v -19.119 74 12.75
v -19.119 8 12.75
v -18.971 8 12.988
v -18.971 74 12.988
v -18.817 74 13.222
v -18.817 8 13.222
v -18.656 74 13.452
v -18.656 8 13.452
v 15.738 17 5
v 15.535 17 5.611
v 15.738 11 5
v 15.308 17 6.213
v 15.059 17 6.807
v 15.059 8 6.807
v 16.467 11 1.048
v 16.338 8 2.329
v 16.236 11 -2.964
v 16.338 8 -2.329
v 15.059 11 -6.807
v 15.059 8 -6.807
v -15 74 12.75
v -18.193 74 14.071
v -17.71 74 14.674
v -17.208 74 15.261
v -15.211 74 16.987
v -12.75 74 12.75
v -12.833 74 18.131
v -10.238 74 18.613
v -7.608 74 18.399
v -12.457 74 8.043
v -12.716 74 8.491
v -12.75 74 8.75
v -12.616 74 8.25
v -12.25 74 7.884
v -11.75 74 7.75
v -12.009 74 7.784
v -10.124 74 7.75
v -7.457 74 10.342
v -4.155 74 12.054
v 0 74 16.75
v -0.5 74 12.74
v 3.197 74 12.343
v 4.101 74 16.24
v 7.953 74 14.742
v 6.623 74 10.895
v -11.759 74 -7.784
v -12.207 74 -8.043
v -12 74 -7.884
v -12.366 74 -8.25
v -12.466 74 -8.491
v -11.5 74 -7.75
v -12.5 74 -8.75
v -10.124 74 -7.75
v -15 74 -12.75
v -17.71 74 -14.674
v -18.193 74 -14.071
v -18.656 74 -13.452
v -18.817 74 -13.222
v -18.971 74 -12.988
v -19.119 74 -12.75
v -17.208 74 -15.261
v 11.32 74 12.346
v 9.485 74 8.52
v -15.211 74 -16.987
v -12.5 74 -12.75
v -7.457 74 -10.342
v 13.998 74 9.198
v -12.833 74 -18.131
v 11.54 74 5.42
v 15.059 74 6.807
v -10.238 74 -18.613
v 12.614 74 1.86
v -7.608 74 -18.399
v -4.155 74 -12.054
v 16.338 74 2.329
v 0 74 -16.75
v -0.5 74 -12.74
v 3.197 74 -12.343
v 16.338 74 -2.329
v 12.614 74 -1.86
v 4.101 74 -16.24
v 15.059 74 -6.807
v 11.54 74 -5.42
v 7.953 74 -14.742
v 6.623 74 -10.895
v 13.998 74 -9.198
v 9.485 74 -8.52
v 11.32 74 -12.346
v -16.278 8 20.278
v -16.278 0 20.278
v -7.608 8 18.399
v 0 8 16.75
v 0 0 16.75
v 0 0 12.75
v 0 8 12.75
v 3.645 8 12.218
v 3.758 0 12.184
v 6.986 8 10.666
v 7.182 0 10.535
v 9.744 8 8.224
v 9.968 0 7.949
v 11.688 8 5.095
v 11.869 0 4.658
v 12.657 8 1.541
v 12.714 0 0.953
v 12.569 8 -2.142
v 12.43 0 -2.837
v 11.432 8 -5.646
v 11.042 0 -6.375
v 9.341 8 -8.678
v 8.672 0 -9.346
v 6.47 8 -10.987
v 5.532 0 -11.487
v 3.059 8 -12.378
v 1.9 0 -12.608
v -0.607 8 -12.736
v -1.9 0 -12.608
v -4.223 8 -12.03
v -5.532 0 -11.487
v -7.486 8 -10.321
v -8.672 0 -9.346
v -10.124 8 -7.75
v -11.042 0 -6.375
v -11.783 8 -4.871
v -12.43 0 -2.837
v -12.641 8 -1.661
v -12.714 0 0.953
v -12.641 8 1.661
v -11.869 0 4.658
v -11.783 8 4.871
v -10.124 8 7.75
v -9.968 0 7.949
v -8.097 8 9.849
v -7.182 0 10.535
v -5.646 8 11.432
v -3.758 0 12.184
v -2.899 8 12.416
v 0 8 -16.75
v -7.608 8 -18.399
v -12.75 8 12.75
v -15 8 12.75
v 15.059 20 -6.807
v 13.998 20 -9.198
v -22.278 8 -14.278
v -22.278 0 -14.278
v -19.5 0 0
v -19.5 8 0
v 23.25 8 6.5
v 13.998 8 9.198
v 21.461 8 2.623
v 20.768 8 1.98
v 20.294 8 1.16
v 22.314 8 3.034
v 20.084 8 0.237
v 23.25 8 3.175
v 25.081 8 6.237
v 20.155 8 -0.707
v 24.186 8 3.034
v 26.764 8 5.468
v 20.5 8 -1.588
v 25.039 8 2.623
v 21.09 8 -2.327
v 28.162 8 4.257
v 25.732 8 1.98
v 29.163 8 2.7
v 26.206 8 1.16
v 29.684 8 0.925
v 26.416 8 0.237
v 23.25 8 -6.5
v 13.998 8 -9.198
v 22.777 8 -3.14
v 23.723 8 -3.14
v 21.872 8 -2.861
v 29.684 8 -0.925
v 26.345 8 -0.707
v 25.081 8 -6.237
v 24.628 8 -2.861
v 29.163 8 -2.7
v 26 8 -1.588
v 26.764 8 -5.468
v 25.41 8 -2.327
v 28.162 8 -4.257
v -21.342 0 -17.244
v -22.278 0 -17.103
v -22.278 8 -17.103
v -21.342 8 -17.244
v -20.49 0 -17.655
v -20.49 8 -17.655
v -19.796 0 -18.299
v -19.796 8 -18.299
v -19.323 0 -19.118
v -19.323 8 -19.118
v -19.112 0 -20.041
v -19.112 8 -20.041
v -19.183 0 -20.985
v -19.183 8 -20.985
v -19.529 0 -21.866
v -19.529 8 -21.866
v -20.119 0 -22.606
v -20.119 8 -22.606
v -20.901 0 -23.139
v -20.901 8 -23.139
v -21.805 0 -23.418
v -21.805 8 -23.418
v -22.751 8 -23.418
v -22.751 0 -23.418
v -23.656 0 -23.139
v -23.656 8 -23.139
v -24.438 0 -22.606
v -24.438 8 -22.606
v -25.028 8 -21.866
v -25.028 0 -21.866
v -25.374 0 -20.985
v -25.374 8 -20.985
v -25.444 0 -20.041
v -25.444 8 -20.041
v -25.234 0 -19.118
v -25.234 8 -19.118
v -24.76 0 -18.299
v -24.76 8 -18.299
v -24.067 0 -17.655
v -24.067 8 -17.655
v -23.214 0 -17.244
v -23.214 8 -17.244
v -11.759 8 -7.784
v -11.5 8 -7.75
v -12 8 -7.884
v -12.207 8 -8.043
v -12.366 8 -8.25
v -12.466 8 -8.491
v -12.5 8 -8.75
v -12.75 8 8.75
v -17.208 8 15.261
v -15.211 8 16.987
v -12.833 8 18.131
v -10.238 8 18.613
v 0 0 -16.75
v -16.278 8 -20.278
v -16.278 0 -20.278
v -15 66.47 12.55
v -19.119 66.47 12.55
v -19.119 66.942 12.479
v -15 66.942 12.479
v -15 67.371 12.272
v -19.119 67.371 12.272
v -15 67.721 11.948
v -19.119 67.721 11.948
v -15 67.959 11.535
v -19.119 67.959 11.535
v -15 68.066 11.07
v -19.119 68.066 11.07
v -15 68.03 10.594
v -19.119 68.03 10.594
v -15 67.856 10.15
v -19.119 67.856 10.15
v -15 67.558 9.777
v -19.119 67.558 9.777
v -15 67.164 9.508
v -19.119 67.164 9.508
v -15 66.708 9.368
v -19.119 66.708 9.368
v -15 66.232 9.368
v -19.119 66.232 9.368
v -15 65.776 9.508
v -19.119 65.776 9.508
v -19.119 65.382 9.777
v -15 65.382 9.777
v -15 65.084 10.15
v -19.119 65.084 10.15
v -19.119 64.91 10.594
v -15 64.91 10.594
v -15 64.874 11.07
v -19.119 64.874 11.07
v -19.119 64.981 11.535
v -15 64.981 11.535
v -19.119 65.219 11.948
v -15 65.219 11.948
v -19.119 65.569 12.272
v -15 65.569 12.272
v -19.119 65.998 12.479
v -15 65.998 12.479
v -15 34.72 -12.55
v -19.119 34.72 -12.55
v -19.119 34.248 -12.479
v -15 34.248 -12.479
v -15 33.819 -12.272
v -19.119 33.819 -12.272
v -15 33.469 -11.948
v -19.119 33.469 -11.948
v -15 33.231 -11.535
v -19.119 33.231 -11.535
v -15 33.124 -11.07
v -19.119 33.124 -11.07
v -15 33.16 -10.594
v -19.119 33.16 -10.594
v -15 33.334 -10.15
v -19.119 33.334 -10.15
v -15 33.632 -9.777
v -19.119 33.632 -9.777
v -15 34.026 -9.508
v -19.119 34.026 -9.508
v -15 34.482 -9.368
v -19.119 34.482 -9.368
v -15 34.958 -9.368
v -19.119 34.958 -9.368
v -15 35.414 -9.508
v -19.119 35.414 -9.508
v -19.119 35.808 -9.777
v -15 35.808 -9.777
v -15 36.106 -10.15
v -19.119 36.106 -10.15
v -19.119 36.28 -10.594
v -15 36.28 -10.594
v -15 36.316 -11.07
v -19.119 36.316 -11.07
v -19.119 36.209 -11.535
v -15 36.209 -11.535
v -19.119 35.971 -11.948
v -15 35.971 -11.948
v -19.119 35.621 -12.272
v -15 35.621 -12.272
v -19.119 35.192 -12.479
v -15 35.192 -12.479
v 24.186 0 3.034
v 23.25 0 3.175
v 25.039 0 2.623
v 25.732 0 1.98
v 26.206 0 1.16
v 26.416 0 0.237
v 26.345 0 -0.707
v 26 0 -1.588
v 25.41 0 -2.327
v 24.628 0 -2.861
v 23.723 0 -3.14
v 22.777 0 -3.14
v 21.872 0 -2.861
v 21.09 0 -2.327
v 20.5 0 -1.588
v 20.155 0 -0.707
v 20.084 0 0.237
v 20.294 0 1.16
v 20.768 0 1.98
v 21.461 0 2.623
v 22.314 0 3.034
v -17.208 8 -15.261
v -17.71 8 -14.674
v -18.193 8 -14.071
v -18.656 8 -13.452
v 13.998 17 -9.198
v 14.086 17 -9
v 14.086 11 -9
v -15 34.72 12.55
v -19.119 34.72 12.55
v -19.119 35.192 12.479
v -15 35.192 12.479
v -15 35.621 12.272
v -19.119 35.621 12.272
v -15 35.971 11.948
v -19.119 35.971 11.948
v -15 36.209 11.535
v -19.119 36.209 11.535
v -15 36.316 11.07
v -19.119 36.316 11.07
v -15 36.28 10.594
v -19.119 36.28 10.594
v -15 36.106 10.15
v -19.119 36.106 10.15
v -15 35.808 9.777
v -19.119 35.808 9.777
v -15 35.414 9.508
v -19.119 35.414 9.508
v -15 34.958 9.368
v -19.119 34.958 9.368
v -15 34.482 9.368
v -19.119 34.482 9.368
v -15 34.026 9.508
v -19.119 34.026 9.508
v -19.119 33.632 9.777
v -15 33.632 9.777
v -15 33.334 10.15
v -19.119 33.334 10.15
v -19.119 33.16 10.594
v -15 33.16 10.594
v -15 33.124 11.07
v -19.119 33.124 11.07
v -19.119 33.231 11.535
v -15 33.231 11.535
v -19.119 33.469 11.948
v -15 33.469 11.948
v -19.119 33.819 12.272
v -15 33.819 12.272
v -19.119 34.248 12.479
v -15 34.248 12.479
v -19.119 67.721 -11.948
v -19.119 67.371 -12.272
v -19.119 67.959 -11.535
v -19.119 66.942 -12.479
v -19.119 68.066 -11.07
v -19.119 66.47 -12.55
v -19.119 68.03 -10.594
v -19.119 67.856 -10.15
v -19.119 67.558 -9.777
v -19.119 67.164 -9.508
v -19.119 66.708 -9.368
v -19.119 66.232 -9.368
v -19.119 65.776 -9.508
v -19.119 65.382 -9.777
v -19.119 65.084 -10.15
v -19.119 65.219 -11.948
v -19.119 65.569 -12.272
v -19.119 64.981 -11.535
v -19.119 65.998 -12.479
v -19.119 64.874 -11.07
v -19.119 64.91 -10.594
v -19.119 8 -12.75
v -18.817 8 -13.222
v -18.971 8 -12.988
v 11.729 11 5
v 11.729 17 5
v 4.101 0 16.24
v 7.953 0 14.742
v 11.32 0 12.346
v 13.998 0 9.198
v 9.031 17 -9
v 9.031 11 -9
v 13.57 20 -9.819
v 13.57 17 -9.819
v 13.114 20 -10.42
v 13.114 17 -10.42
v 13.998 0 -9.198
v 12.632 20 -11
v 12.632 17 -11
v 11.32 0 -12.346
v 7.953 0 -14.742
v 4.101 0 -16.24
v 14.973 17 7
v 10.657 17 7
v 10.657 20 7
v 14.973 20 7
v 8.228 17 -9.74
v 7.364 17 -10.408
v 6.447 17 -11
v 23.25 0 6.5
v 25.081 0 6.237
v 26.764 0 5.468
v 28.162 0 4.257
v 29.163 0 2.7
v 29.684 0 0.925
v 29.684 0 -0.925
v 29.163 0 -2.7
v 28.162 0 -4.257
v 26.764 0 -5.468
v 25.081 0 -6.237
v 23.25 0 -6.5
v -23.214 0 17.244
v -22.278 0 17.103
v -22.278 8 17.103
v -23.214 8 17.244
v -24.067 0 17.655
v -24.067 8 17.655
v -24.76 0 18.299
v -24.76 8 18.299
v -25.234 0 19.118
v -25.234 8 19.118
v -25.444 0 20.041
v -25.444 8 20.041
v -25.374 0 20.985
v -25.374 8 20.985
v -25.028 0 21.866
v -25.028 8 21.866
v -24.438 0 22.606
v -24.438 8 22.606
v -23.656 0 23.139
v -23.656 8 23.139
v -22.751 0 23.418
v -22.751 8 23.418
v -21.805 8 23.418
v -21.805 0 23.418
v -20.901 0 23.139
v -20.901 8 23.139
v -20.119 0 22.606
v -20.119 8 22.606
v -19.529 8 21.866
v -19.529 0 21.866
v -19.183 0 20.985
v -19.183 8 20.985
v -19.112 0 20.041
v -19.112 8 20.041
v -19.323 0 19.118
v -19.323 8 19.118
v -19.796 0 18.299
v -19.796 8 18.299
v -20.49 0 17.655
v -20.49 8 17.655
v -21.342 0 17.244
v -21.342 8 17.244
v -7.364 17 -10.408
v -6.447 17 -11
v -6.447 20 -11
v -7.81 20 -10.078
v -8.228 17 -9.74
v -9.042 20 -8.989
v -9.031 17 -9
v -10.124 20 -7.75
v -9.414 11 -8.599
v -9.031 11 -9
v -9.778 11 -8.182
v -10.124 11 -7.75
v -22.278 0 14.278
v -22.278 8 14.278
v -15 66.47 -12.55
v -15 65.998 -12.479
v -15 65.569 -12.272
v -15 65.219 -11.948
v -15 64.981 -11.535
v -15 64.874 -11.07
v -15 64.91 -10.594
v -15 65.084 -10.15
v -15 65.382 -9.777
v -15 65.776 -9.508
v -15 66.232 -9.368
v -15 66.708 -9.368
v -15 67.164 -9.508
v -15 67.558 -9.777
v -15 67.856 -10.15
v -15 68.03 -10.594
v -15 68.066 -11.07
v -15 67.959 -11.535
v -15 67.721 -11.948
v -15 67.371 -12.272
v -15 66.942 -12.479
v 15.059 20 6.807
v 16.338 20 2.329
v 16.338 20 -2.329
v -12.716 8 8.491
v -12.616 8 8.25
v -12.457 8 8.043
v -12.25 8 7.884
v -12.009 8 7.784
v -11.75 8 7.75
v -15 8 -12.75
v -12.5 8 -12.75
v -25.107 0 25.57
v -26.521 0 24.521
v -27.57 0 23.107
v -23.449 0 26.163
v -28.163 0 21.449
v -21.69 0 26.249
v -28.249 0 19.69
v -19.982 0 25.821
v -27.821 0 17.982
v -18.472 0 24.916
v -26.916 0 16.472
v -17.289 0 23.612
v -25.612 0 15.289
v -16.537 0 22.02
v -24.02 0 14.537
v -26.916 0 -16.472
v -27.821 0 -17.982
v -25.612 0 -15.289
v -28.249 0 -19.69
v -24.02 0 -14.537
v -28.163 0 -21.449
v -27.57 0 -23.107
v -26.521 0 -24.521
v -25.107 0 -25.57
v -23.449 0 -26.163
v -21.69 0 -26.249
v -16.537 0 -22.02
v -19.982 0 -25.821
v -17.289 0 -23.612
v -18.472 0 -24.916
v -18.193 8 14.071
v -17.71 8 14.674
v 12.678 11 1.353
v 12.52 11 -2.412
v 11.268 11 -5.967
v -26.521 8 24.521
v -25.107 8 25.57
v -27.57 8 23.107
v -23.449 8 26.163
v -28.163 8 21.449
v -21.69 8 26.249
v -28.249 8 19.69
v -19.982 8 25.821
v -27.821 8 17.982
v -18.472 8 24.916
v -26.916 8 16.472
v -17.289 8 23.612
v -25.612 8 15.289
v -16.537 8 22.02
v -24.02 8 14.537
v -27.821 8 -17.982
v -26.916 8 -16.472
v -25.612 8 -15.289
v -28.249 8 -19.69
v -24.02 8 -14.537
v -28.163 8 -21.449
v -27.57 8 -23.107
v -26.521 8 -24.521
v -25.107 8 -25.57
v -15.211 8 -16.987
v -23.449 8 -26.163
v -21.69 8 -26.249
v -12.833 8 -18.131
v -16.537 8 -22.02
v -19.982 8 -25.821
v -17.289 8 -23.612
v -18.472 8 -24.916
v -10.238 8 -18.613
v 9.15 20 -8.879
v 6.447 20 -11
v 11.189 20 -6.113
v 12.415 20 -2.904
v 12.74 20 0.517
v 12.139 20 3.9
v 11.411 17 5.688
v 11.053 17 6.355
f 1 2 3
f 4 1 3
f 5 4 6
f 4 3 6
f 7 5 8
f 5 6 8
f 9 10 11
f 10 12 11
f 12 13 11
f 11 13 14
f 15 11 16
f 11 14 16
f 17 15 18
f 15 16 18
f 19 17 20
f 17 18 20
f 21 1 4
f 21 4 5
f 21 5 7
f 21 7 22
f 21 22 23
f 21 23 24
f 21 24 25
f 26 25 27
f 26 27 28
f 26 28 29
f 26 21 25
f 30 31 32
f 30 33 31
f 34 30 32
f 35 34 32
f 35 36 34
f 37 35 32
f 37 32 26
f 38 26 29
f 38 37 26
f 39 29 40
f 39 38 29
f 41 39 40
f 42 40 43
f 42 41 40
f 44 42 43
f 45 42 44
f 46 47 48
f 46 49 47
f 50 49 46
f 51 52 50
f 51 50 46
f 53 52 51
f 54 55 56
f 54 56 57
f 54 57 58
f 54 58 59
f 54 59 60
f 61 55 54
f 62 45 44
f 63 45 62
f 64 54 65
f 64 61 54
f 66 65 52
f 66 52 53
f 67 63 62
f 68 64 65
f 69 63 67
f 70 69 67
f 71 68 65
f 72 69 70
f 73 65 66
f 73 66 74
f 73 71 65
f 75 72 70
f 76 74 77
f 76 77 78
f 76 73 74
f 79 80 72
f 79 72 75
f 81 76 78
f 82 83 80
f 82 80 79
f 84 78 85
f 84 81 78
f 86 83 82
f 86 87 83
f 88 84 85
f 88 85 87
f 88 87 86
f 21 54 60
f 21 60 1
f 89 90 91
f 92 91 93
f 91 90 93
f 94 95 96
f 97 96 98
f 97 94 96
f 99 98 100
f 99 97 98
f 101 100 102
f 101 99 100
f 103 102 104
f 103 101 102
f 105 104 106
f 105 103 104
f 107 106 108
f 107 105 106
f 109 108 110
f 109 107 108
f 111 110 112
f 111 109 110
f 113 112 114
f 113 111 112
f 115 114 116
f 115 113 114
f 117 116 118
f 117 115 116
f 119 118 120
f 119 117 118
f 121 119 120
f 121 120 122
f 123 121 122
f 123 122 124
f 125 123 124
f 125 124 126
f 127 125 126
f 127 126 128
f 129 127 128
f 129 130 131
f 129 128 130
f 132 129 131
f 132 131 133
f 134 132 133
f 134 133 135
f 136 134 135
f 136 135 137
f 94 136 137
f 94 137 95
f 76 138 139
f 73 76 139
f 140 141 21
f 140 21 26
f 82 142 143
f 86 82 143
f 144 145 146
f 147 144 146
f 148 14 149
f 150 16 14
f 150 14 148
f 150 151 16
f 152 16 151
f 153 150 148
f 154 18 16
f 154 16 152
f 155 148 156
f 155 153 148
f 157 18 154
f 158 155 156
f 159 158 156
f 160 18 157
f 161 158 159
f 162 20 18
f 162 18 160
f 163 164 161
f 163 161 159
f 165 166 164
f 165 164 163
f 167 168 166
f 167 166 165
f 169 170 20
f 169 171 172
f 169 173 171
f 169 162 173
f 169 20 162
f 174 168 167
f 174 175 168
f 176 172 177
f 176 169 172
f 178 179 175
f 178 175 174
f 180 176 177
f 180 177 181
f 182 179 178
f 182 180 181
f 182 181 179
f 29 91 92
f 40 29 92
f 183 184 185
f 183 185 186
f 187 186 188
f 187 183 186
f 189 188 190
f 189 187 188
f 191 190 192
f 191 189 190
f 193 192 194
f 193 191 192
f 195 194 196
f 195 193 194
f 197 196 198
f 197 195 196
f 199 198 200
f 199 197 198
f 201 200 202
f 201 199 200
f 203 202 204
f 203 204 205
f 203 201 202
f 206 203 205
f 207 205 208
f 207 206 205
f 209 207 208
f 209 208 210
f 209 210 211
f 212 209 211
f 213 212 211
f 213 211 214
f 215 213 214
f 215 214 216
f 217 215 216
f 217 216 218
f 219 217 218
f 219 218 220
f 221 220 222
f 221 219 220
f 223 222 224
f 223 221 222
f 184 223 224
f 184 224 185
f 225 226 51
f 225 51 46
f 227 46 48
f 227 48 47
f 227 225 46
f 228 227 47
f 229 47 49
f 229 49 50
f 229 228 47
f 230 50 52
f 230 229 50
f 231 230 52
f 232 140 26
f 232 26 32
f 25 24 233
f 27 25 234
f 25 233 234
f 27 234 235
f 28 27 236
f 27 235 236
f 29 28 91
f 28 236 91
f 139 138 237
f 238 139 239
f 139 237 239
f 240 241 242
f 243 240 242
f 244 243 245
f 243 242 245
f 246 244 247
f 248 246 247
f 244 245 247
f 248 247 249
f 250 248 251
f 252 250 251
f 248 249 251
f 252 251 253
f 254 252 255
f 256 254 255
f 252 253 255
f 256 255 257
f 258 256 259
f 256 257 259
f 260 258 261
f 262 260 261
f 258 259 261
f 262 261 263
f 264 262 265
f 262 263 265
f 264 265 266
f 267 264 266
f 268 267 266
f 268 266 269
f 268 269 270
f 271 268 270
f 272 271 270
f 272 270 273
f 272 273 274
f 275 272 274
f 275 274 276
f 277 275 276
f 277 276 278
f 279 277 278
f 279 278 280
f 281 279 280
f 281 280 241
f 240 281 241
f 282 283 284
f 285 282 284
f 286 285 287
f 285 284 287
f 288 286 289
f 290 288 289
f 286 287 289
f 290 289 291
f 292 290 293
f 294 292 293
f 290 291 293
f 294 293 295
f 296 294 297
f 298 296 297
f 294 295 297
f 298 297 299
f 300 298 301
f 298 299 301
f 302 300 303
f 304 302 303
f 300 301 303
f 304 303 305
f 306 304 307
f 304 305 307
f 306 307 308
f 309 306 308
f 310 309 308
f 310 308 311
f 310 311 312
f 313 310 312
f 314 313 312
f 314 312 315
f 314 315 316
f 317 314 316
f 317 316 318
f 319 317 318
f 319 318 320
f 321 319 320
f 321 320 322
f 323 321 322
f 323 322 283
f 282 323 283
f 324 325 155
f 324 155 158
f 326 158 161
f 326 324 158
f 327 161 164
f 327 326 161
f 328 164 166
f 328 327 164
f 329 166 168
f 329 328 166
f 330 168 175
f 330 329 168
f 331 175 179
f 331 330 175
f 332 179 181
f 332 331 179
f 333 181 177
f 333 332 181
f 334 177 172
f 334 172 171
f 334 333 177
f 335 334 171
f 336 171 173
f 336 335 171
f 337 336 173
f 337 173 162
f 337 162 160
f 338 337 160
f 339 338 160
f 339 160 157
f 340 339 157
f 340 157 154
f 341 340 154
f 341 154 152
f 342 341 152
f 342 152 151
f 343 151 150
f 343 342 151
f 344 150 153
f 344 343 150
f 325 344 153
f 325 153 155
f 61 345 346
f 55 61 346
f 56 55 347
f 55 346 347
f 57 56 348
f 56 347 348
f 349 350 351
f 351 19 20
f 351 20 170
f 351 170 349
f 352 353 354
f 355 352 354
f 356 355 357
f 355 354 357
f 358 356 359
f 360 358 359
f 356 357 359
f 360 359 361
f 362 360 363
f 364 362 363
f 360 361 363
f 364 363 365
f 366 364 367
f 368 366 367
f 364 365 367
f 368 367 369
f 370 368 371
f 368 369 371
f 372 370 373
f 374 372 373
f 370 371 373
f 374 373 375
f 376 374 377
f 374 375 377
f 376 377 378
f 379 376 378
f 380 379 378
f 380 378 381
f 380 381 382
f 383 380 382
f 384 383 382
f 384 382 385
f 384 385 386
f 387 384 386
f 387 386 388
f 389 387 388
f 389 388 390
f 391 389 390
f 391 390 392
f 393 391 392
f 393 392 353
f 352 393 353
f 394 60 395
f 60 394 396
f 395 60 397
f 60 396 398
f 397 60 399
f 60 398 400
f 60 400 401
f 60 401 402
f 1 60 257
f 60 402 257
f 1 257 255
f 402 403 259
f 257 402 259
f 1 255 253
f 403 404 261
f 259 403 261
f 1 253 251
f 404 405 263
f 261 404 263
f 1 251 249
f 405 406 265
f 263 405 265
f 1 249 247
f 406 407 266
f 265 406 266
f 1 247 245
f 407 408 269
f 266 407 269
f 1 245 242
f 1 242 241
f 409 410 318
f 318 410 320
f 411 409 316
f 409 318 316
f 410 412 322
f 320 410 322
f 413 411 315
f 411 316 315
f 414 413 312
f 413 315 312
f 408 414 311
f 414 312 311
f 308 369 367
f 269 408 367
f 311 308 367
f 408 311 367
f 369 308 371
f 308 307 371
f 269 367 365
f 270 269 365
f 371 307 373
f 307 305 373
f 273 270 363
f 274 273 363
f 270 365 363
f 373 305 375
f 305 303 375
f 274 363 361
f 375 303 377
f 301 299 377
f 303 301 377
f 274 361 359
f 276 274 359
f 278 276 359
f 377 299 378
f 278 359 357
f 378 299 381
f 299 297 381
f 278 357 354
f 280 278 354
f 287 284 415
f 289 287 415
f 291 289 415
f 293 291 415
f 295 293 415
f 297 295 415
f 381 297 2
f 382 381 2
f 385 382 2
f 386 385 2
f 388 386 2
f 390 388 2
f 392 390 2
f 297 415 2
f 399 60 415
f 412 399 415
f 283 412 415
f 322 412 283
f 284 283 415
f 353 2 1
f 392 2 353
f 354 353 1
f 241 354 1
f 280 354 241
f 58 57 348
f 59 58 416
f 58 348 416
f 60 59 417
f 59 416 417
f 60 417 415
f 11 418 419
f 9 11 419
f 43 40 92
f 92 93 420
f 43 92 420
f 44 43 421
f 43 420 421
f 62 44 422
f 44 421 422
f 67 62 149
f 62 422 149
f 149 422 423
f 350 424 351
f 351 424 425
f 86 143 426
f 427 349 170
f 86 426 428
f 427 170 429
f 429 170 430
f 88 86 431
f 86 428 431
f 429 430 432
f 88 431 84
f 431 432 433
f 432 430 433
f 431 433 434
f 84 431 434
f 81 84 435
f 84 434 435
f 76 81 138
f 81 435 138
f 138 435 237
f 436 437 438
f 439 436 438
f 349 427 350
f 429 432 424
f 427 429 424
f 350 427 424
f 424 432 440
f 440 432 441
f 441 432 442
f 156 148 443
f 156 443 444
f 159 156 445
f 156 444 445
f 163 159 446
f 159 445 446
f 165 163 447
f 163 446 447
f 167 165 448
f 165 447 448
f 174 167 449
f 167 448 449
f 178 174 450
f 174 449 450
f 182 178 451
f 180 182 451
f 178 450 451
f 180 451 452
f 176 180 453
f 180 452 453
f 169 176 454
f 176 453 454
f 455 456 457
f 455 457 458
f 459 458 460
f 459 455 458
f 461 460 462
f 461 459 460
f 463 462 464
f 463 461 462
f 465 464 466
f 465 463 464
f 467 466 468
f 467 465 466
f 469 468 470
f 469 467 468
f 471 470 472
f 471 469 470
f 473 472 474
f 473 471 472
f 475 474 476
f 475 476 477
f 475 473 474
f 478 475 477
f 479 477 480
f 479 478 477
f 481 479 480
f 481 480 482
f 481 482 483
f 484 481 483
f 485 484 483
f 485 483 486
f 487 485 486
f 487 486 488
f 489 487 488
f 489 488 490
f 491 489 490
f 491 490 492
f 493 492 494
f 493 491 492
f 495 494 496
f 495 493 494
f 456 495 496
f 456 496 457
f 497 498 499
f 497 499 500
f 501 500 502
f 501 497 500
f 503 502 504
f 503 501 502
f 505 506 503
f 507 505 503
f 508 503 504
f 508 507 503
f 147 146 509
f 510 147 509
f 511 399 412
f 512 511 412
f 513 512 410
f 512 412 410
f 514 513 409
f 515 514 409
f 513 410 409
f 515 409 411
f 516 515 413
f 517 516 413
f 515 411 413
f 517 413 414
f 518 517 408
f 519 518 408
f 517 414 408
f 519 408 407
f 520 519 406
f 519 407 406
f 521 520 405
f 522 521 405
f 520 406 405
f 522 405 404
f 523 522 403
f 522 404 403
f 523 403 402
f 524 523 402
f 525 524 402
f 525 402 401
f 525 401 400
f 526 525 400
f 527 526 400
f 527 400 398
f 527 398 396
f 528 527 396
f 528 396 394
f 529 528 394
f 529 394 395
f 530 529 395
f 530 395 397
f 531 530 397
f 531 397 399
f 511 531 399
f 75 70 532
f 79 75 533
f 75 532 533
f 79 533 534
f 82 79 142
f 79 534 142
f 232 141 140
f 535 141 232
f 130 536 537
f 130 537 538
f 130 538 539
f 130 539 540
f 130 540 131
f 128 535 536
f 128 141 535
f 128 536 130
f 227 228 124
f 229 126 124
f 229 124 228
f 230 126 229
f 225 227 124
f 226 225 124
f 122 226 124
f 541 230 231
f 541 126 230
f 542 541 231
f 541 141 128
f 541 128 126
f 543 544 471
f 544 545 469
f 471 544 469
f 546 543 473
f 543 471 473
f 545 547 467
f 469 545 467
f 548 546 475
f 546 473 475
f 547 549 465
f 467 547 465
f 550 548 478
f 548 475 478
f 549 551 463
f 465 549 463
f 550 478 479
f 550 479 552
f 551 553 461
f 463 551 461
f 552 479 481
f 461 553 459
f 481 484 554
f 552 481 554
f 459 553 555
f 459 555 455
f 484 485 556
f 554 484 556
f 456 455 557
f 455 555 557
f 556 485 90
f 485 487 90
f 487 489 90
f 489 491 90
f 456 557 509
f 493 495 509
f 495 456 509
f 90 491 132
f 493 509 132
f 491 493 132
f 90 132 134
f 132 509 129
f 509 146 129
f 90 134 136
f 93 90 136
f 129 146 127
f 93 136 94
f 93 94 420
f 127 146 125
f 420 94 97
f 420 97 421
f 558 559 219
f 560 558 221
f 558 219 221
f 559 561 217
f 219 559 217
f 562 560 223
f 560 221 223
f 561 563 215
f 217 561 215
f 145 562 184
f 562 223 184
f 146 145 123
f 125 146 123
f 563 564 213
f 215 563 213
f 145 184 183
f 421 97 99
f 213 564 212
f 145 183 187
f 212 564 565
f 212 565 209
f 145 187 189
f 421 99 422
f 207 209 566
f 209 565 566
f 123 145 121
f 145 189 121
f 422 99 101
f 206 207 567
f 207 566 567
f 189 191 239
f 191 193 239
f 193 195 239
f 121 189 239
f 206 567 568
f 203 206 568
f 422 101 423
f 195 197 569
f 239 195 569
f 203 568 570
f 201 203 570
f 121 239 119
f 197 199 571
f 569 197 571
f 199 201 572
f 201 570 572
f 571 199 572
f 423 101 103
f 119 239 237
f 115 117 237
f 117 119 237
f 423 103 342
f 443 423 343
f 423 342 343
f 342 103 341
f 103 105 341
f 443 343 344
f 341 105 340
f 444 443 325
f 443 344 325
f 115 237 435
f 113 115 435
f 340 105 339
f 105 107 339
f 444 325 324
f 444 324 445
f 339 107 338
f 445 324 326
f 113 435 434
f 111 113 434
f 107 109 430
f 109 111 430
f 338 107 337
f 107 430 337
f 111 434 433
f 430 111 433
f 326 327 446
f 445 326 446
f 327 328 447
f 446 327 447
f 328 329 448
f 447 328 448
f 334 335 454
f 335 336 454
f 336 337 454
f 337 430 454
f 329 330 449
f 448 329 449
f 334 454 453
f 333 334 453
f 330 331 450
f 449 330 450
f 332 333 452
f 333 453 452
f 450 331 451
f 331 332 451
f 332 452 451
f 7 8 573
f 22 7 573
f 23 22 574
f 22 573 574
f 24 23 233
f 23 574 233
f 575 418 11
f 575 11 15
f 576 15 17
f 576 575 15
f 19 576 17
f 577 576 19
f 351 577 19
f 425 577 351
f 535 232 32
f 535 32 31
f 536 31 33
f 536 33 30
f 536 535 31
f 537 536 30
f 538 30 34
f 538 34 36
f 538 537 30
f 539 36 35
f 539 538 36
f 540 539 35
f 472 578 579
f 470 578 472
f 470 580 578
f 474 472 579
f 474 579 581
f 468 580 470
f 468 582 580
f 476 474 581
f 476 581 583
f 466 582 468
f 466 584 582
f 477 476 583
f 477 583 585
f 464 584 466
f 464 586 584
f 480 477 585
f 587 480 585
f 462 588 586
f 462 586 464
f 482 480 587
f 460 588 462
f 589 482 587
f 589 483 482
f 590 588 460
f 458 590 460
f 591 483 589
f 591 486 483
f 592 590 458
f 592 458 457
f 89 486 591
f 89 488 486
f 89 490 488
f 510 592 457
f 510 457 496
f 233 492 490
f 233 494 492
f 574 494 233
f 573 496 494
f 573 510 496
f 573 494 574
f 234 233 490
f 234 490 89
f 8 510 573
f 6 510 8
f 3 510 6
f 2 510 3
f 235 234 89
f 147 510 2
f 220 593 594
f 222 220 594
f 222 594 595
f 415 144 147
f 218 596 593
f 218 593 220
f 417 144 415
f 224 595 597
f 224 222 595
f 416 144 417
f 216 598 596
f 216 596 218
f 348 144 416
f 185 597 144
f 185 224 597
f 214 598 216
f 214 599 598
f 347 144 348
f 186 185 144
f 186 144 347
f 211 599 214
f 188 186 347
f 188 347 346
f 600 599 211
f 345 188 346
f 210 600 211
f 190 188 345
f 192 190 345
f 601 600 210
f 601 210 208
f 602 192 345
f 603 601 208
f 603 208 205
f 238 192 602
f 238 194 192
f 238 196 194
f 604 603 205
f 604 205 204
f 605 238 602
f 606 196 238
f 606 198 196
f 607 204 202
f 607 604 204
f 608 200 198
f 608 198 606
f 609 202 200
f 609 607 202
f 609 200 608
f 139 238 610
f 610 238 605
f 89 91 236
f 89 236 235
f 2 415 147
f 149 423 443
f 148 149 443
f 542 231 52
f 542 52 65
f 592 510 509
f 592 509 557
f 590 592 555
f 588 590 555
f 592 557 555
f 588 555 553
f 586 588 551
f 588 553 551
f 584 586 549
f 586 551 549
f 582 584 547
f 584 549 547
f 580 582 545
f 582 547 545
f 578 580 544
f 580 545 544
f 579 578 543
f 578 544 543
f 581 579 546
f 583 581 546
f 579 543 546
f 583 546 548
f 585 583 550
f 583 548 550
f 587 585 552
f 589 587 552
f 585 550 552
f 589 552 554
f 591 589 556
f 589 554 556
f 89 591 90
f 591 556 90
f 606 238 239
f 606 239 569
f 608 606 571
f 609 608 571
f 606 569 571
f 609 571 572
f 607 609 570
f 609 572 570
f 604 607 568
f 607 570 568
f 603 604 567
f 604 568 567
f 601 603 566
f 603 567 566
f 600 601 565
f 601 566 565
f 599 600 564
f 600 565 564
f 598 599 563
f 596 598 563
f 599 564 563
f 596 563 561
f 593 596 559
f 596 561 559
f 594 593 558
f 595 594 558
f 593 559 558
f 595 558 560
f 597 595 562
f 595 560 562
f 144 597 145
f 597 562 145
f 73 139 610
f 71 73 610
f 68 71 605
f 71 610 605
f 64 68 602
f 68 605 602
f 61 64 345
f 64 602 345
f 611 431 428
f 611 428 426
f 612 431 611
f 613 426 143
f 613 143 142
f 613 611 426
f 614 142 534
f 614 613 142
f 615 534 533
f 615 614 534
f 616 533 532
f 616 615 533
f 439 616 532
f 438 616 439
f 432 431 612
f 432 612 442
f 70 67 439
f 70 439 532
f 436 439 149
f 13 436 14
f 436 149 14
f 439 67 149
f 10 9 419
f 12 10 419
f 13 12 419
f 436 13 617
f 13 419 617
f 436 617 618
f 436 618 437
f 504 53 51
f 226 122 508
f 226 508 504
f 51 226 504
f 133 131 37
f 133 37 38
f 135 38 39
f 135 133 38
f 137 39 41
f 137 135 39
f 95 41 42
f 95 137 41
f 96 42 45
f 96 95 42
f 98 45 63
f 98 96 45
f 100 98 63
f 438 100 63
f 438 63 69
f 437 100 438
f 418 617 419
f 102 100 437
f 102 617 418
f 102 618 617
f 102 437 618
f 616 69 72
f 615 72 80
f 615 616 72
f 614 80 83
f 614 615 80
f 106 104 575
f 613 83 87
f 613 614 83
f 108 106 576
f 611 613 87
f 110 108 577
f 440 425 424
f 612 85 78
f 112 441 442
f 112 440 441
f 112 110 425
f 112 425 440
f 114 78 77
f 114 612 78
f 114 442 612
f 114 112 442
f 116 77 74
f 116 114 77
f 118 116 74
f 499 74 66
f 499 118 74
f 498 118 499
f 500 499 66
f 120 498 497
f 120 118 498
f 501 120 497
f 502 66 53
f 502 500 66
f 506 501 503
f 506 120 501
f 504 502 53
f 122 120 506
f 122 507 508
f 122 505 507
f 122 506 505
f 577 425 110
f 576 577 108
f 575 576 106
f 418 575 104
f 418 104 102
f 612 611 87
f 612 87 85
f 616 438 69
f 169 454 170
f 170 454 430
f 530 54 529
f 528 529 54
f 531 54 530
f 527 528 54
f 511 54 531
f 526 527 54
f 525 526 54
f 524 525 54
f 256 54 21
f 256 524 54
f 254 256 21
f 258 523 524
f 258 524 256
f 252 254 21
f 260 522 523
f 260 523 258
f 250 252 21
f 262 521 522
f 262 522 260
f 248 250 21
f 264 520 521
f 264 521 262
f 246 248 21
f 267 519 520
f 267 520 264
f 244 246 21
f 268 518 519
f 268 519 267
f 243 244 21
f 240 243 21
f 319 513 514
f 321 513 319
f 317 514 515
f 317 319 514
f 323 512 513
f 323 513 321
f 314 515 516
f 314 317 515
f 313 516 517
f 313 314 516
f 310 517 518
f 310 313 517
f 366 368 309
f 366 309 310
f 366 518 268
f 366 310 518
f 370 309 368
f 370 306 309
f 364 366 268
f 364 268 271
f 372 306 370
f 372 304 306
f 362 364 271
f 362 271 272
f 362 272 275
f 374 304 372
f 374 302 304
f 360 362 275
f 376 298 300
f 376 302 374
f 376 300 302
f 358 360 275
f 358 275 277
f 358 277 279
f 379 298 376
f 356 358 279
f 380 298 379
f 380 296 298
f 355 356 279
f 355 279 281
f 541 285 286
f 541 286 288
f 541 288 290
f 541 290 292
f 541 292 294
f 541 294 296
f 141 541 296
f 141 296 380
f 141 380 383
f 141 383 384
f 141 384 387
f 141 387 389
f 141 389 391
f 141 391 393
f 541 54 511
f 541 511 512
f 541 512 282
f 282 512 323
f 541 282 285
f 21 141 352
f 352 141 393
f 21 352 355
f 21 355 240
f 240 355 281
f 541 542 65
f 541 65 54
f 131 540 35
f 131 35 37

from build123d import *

# Parameters (mm, degrees)
SKETCH1_R           = 12.75
SKETCH1_R_2         = 3.175
BOSS_EXTRUDE2_DEPTH = 8
BOSS_EXTRUDE3_DEPTH = 66
SKETCH4_R           = 1.6
CUT_EXTRUDE1_DEPTH  = 6
CUT_EXTRUDE2_DEPTH  = 62
BOSS_EXTRUDE4_DEPTH = 10
CUT_EXTRUDE3_START  = -66
CUT_EXTRUDE3_DEPTH  = 66


with BuildPart() as part:
    # Sketch1 → Boss-Extrude2 (new body)
    with BuildSketch(Plane(origin=(0, 0, 0), x_dir=(1, 0, 0), z_dir=(0, 1, 0))):
        with BuildLine():
            Line((0, 16.75), (-16.278174593, 20.278174593))
            ThreePointArc((-16.278174593, 20.278174593), (-26.52081528, 24.52081528), (-22.278174593, 14.278174593))
            Line((-22.278174593, 14.278174593), (-19.5, 0))
            Line((-19.5, 0), (-22.278174593, -14.278174593))
            ThreePointArc((-22.278174593, -14.278174593), (-26.52081528, -24.52081528), (-16.278174593, -20.278174593))
            Line((-16.278174593, -20.278174593), (0, -16.75))
            ThreePointArc((0, -16.75), (7.9526392, -14.741710543), (13.998269272, -9.198421462))
            Line((13.998269272, -9.198421462), (23.25, -6.5))
            ThreePointArc((23.25, -6.5), (29.75, 0), (23.25, 6.5))
            Line((23.25, 6.5), (13.998269272, 9.198421462))
            ThreePointArc((13.998269272, 9.198421462), (7.9526392, 14.741710543), (0, 16.75))
        make_face()
        with Locations(Location((0, 0, 0), (0, 0, 270))):
            Circle(SKETCH1_R, mode=Mode.SUBTRACT)
        with Locations(Location((23.25, 0, 0), (0, 0, 270))):
            Circle(SKETCH1_R_2, mode=Mode.SUBTRACT)
        with Locations(Location((-22.278174593, 20.278174593, 0), (0, 0, 270))):
            Circle(SKETCH1_R_2, mode=Mode.SUBTRACT)
        with Locations(Location((-22.278174593, -20.278174593, 0), (0, 0, 90))):
            Circle(SKETCH1_R_2, mode=Mode.SUBTRACT)
    extrude(amount=BOSS_EXTRUDE2_DEPTH)

    # Sketch2 → Boss-Extrude3 (add)
    with BuildSketch(Plane(origin=(0, 8, 0), x_dir=(1, 0, 0), z_dir=(0, 1, 0))):
        with BuildLine():
            Line((-7.607743292, -18.398922392), (0, -16.75))
            ThreePointArc((0, -16.75), (7.9526392, -14.741710543), (13.998269272, -9.198421462))
            Line((13.998269272, -9.198421462), (15.058663133, -6.806802563))
            ThreePointArc((15.058663133, -6.806802563), (16.5, 0), (15.058663133, 6.806802563))
            Line((15.058663133, 6.806802563), (13.998269272, 9.198421462))
            ThreePointArc((13.998269272, 9.198421462), (7.9526392, 14.741710543), (0, 16.75))
            Line((0, 16.75), (-7.607743292, 18.398922392))
            ThreePointArc((-7.607743292, 18.398922392), (-12.83286117, 18.130965758), (-17.207513674, 15.261109827))
            ThreePointArc((-17.207513674, 15.261109827), (-17.954443829, 14.374906845), (-18.65578326, 13.452202458))
            ThreePointArc((-18.65578326, 13.452202458), (-18.894540484, 13.105967779), (-19.118527996, 12.75))
            Line((-19.118527996, 12.75), (-19.118527996, -12.75))
            ThreePointArc((-19.118527996, -12.75), (-18.894540484, -13.105967779), (-18.65578326, -13.452202458))
            ThreePointArc((-18.65578326, -13.452202458), (-17.954443829, -14.374906845), (-17.207513674, -15.261109827))
            ThreePointArc((-17.207513674, -15.261109827), (-12.83286117, -18.130965758), (-7.607743292, -18.398922392))
        make_face()
        with BuildLine():
            Line((-15, 12.75), (-15, -12.75))
            Line((-15, -12.75), (-12.75, -12.75))
            Line((-12.75, -12.75), (-12.75, -8.75))
            ThreePointArc((-12.75, -8.75), (-12.457106781, -8.042893219), (-11.75, -7.75))
            Line((-11.75, -7.75), (-10.124228366, -7.75))
            ThreePointArc((-10.124228366, -7.75), (12.75, 0), (-10.124228366, 7.75))
            Line((-10.124228366, 7.75), (-11.5, 7.75))
            ThreePointArc((-11.5, 7.75), (-12.207106781, 8.042893219), (-12.5, 8.75))
            Line((-12.5, 8.75), (-12.5, 12.75))
            Line((-12.5, 12.75), (-15, 12.75))
        make_face(mode=Mode.SUBTRACT)
    extrude(amount=BOSS_EXTRUDE3_DEPTH)

    # Sketch4 → Cut-Extrude1 (cut)
    with BuildSketch(Plane.ZY.offset(19.118527996)):
        with Locations((10.95, 66.47)):
            Circle(SKETCH4_R)
        with Locations(Location((-10.95, 66.47, 0), (0, 0, 180))):
            Circle(SKETCH4_R)
        with Locations((10.95, 34.72)):
            Circle(SKETCH4_R)
        with Locations(Location((-10.95, 34.72, 0), (0, 0, 180))):
            Circle(SKETCH4_R)
    extrude(amount=-CUT_EXTRUDE1_DEPTH, mode=Mode.SUBTRACT)

    # Sketch5 → Cut-Extrude2 (cut)
    with BuildSketch(Plane(origin=(-15, 0, 0), x_dir=(0, 0, -1), z_dir=(1, 0, 0))):
        Polygon((-5, 17), (-7, 17), (-7, 20), (0, 20), (11, 20), (11, 17), (9, 17), (9, 11), (0, 11), (-5, 11), align=None)
    extrude(amount=CUT_EXTRUDE2_DEPTH, mode=Mode.SUBTRACT)

    # Sketch6 → Boss-Extrude4 (add)
    with BuildSketch(Plane(origin=(-15, 0, 0), x_dir=(0, 0, -1), z_dir=(1, 0, 0))):
        Polygon((11, 20), (11, 17), (9, 17), (9, 11), (6.130608727, 11), (6.130608727, 20), align=None)
    extrude(amount=BOSS_EXTRUDE4_DEPTH)

    # Sketch7 → Cut-Extrude3 (cut)
    with BuildSketch(Plane(origin=(0, 74, 0), x_dir=(1, 0, 0), z_dir=(0, 1, 0)).offset(CUT_EXTRUDE3_START)):
        with BuildLine():
            Line((-15, 12.75), (-15, 4.5))
            Line((-15, 4.5), (-3.997712125, 4.5))
            Line((-3.997712125, 4.5), (-3.997712125, 12.107055702))
            ThreePointArc((-3.997712125, 12.107055702), (-7.389403522, 10.39034242), (-10.124228366, 7.75))
            Line((-10.124228366, 7.75), (-11.5, 7.75))
            ThreePointArc((-11.5, 7.75), (-12.207106781, 8.042893219), (-12.5, 8.75))
            Line((-12.5, 8.75), (-12.5, 12.75))
            Line((-12.5, 12.75), (-15, 12.75))
        make_face()
    extrude(amount=CUT_EXTRUDE3_DEPTH, mode=Mode.SUBTRACT)


solid = part.part
